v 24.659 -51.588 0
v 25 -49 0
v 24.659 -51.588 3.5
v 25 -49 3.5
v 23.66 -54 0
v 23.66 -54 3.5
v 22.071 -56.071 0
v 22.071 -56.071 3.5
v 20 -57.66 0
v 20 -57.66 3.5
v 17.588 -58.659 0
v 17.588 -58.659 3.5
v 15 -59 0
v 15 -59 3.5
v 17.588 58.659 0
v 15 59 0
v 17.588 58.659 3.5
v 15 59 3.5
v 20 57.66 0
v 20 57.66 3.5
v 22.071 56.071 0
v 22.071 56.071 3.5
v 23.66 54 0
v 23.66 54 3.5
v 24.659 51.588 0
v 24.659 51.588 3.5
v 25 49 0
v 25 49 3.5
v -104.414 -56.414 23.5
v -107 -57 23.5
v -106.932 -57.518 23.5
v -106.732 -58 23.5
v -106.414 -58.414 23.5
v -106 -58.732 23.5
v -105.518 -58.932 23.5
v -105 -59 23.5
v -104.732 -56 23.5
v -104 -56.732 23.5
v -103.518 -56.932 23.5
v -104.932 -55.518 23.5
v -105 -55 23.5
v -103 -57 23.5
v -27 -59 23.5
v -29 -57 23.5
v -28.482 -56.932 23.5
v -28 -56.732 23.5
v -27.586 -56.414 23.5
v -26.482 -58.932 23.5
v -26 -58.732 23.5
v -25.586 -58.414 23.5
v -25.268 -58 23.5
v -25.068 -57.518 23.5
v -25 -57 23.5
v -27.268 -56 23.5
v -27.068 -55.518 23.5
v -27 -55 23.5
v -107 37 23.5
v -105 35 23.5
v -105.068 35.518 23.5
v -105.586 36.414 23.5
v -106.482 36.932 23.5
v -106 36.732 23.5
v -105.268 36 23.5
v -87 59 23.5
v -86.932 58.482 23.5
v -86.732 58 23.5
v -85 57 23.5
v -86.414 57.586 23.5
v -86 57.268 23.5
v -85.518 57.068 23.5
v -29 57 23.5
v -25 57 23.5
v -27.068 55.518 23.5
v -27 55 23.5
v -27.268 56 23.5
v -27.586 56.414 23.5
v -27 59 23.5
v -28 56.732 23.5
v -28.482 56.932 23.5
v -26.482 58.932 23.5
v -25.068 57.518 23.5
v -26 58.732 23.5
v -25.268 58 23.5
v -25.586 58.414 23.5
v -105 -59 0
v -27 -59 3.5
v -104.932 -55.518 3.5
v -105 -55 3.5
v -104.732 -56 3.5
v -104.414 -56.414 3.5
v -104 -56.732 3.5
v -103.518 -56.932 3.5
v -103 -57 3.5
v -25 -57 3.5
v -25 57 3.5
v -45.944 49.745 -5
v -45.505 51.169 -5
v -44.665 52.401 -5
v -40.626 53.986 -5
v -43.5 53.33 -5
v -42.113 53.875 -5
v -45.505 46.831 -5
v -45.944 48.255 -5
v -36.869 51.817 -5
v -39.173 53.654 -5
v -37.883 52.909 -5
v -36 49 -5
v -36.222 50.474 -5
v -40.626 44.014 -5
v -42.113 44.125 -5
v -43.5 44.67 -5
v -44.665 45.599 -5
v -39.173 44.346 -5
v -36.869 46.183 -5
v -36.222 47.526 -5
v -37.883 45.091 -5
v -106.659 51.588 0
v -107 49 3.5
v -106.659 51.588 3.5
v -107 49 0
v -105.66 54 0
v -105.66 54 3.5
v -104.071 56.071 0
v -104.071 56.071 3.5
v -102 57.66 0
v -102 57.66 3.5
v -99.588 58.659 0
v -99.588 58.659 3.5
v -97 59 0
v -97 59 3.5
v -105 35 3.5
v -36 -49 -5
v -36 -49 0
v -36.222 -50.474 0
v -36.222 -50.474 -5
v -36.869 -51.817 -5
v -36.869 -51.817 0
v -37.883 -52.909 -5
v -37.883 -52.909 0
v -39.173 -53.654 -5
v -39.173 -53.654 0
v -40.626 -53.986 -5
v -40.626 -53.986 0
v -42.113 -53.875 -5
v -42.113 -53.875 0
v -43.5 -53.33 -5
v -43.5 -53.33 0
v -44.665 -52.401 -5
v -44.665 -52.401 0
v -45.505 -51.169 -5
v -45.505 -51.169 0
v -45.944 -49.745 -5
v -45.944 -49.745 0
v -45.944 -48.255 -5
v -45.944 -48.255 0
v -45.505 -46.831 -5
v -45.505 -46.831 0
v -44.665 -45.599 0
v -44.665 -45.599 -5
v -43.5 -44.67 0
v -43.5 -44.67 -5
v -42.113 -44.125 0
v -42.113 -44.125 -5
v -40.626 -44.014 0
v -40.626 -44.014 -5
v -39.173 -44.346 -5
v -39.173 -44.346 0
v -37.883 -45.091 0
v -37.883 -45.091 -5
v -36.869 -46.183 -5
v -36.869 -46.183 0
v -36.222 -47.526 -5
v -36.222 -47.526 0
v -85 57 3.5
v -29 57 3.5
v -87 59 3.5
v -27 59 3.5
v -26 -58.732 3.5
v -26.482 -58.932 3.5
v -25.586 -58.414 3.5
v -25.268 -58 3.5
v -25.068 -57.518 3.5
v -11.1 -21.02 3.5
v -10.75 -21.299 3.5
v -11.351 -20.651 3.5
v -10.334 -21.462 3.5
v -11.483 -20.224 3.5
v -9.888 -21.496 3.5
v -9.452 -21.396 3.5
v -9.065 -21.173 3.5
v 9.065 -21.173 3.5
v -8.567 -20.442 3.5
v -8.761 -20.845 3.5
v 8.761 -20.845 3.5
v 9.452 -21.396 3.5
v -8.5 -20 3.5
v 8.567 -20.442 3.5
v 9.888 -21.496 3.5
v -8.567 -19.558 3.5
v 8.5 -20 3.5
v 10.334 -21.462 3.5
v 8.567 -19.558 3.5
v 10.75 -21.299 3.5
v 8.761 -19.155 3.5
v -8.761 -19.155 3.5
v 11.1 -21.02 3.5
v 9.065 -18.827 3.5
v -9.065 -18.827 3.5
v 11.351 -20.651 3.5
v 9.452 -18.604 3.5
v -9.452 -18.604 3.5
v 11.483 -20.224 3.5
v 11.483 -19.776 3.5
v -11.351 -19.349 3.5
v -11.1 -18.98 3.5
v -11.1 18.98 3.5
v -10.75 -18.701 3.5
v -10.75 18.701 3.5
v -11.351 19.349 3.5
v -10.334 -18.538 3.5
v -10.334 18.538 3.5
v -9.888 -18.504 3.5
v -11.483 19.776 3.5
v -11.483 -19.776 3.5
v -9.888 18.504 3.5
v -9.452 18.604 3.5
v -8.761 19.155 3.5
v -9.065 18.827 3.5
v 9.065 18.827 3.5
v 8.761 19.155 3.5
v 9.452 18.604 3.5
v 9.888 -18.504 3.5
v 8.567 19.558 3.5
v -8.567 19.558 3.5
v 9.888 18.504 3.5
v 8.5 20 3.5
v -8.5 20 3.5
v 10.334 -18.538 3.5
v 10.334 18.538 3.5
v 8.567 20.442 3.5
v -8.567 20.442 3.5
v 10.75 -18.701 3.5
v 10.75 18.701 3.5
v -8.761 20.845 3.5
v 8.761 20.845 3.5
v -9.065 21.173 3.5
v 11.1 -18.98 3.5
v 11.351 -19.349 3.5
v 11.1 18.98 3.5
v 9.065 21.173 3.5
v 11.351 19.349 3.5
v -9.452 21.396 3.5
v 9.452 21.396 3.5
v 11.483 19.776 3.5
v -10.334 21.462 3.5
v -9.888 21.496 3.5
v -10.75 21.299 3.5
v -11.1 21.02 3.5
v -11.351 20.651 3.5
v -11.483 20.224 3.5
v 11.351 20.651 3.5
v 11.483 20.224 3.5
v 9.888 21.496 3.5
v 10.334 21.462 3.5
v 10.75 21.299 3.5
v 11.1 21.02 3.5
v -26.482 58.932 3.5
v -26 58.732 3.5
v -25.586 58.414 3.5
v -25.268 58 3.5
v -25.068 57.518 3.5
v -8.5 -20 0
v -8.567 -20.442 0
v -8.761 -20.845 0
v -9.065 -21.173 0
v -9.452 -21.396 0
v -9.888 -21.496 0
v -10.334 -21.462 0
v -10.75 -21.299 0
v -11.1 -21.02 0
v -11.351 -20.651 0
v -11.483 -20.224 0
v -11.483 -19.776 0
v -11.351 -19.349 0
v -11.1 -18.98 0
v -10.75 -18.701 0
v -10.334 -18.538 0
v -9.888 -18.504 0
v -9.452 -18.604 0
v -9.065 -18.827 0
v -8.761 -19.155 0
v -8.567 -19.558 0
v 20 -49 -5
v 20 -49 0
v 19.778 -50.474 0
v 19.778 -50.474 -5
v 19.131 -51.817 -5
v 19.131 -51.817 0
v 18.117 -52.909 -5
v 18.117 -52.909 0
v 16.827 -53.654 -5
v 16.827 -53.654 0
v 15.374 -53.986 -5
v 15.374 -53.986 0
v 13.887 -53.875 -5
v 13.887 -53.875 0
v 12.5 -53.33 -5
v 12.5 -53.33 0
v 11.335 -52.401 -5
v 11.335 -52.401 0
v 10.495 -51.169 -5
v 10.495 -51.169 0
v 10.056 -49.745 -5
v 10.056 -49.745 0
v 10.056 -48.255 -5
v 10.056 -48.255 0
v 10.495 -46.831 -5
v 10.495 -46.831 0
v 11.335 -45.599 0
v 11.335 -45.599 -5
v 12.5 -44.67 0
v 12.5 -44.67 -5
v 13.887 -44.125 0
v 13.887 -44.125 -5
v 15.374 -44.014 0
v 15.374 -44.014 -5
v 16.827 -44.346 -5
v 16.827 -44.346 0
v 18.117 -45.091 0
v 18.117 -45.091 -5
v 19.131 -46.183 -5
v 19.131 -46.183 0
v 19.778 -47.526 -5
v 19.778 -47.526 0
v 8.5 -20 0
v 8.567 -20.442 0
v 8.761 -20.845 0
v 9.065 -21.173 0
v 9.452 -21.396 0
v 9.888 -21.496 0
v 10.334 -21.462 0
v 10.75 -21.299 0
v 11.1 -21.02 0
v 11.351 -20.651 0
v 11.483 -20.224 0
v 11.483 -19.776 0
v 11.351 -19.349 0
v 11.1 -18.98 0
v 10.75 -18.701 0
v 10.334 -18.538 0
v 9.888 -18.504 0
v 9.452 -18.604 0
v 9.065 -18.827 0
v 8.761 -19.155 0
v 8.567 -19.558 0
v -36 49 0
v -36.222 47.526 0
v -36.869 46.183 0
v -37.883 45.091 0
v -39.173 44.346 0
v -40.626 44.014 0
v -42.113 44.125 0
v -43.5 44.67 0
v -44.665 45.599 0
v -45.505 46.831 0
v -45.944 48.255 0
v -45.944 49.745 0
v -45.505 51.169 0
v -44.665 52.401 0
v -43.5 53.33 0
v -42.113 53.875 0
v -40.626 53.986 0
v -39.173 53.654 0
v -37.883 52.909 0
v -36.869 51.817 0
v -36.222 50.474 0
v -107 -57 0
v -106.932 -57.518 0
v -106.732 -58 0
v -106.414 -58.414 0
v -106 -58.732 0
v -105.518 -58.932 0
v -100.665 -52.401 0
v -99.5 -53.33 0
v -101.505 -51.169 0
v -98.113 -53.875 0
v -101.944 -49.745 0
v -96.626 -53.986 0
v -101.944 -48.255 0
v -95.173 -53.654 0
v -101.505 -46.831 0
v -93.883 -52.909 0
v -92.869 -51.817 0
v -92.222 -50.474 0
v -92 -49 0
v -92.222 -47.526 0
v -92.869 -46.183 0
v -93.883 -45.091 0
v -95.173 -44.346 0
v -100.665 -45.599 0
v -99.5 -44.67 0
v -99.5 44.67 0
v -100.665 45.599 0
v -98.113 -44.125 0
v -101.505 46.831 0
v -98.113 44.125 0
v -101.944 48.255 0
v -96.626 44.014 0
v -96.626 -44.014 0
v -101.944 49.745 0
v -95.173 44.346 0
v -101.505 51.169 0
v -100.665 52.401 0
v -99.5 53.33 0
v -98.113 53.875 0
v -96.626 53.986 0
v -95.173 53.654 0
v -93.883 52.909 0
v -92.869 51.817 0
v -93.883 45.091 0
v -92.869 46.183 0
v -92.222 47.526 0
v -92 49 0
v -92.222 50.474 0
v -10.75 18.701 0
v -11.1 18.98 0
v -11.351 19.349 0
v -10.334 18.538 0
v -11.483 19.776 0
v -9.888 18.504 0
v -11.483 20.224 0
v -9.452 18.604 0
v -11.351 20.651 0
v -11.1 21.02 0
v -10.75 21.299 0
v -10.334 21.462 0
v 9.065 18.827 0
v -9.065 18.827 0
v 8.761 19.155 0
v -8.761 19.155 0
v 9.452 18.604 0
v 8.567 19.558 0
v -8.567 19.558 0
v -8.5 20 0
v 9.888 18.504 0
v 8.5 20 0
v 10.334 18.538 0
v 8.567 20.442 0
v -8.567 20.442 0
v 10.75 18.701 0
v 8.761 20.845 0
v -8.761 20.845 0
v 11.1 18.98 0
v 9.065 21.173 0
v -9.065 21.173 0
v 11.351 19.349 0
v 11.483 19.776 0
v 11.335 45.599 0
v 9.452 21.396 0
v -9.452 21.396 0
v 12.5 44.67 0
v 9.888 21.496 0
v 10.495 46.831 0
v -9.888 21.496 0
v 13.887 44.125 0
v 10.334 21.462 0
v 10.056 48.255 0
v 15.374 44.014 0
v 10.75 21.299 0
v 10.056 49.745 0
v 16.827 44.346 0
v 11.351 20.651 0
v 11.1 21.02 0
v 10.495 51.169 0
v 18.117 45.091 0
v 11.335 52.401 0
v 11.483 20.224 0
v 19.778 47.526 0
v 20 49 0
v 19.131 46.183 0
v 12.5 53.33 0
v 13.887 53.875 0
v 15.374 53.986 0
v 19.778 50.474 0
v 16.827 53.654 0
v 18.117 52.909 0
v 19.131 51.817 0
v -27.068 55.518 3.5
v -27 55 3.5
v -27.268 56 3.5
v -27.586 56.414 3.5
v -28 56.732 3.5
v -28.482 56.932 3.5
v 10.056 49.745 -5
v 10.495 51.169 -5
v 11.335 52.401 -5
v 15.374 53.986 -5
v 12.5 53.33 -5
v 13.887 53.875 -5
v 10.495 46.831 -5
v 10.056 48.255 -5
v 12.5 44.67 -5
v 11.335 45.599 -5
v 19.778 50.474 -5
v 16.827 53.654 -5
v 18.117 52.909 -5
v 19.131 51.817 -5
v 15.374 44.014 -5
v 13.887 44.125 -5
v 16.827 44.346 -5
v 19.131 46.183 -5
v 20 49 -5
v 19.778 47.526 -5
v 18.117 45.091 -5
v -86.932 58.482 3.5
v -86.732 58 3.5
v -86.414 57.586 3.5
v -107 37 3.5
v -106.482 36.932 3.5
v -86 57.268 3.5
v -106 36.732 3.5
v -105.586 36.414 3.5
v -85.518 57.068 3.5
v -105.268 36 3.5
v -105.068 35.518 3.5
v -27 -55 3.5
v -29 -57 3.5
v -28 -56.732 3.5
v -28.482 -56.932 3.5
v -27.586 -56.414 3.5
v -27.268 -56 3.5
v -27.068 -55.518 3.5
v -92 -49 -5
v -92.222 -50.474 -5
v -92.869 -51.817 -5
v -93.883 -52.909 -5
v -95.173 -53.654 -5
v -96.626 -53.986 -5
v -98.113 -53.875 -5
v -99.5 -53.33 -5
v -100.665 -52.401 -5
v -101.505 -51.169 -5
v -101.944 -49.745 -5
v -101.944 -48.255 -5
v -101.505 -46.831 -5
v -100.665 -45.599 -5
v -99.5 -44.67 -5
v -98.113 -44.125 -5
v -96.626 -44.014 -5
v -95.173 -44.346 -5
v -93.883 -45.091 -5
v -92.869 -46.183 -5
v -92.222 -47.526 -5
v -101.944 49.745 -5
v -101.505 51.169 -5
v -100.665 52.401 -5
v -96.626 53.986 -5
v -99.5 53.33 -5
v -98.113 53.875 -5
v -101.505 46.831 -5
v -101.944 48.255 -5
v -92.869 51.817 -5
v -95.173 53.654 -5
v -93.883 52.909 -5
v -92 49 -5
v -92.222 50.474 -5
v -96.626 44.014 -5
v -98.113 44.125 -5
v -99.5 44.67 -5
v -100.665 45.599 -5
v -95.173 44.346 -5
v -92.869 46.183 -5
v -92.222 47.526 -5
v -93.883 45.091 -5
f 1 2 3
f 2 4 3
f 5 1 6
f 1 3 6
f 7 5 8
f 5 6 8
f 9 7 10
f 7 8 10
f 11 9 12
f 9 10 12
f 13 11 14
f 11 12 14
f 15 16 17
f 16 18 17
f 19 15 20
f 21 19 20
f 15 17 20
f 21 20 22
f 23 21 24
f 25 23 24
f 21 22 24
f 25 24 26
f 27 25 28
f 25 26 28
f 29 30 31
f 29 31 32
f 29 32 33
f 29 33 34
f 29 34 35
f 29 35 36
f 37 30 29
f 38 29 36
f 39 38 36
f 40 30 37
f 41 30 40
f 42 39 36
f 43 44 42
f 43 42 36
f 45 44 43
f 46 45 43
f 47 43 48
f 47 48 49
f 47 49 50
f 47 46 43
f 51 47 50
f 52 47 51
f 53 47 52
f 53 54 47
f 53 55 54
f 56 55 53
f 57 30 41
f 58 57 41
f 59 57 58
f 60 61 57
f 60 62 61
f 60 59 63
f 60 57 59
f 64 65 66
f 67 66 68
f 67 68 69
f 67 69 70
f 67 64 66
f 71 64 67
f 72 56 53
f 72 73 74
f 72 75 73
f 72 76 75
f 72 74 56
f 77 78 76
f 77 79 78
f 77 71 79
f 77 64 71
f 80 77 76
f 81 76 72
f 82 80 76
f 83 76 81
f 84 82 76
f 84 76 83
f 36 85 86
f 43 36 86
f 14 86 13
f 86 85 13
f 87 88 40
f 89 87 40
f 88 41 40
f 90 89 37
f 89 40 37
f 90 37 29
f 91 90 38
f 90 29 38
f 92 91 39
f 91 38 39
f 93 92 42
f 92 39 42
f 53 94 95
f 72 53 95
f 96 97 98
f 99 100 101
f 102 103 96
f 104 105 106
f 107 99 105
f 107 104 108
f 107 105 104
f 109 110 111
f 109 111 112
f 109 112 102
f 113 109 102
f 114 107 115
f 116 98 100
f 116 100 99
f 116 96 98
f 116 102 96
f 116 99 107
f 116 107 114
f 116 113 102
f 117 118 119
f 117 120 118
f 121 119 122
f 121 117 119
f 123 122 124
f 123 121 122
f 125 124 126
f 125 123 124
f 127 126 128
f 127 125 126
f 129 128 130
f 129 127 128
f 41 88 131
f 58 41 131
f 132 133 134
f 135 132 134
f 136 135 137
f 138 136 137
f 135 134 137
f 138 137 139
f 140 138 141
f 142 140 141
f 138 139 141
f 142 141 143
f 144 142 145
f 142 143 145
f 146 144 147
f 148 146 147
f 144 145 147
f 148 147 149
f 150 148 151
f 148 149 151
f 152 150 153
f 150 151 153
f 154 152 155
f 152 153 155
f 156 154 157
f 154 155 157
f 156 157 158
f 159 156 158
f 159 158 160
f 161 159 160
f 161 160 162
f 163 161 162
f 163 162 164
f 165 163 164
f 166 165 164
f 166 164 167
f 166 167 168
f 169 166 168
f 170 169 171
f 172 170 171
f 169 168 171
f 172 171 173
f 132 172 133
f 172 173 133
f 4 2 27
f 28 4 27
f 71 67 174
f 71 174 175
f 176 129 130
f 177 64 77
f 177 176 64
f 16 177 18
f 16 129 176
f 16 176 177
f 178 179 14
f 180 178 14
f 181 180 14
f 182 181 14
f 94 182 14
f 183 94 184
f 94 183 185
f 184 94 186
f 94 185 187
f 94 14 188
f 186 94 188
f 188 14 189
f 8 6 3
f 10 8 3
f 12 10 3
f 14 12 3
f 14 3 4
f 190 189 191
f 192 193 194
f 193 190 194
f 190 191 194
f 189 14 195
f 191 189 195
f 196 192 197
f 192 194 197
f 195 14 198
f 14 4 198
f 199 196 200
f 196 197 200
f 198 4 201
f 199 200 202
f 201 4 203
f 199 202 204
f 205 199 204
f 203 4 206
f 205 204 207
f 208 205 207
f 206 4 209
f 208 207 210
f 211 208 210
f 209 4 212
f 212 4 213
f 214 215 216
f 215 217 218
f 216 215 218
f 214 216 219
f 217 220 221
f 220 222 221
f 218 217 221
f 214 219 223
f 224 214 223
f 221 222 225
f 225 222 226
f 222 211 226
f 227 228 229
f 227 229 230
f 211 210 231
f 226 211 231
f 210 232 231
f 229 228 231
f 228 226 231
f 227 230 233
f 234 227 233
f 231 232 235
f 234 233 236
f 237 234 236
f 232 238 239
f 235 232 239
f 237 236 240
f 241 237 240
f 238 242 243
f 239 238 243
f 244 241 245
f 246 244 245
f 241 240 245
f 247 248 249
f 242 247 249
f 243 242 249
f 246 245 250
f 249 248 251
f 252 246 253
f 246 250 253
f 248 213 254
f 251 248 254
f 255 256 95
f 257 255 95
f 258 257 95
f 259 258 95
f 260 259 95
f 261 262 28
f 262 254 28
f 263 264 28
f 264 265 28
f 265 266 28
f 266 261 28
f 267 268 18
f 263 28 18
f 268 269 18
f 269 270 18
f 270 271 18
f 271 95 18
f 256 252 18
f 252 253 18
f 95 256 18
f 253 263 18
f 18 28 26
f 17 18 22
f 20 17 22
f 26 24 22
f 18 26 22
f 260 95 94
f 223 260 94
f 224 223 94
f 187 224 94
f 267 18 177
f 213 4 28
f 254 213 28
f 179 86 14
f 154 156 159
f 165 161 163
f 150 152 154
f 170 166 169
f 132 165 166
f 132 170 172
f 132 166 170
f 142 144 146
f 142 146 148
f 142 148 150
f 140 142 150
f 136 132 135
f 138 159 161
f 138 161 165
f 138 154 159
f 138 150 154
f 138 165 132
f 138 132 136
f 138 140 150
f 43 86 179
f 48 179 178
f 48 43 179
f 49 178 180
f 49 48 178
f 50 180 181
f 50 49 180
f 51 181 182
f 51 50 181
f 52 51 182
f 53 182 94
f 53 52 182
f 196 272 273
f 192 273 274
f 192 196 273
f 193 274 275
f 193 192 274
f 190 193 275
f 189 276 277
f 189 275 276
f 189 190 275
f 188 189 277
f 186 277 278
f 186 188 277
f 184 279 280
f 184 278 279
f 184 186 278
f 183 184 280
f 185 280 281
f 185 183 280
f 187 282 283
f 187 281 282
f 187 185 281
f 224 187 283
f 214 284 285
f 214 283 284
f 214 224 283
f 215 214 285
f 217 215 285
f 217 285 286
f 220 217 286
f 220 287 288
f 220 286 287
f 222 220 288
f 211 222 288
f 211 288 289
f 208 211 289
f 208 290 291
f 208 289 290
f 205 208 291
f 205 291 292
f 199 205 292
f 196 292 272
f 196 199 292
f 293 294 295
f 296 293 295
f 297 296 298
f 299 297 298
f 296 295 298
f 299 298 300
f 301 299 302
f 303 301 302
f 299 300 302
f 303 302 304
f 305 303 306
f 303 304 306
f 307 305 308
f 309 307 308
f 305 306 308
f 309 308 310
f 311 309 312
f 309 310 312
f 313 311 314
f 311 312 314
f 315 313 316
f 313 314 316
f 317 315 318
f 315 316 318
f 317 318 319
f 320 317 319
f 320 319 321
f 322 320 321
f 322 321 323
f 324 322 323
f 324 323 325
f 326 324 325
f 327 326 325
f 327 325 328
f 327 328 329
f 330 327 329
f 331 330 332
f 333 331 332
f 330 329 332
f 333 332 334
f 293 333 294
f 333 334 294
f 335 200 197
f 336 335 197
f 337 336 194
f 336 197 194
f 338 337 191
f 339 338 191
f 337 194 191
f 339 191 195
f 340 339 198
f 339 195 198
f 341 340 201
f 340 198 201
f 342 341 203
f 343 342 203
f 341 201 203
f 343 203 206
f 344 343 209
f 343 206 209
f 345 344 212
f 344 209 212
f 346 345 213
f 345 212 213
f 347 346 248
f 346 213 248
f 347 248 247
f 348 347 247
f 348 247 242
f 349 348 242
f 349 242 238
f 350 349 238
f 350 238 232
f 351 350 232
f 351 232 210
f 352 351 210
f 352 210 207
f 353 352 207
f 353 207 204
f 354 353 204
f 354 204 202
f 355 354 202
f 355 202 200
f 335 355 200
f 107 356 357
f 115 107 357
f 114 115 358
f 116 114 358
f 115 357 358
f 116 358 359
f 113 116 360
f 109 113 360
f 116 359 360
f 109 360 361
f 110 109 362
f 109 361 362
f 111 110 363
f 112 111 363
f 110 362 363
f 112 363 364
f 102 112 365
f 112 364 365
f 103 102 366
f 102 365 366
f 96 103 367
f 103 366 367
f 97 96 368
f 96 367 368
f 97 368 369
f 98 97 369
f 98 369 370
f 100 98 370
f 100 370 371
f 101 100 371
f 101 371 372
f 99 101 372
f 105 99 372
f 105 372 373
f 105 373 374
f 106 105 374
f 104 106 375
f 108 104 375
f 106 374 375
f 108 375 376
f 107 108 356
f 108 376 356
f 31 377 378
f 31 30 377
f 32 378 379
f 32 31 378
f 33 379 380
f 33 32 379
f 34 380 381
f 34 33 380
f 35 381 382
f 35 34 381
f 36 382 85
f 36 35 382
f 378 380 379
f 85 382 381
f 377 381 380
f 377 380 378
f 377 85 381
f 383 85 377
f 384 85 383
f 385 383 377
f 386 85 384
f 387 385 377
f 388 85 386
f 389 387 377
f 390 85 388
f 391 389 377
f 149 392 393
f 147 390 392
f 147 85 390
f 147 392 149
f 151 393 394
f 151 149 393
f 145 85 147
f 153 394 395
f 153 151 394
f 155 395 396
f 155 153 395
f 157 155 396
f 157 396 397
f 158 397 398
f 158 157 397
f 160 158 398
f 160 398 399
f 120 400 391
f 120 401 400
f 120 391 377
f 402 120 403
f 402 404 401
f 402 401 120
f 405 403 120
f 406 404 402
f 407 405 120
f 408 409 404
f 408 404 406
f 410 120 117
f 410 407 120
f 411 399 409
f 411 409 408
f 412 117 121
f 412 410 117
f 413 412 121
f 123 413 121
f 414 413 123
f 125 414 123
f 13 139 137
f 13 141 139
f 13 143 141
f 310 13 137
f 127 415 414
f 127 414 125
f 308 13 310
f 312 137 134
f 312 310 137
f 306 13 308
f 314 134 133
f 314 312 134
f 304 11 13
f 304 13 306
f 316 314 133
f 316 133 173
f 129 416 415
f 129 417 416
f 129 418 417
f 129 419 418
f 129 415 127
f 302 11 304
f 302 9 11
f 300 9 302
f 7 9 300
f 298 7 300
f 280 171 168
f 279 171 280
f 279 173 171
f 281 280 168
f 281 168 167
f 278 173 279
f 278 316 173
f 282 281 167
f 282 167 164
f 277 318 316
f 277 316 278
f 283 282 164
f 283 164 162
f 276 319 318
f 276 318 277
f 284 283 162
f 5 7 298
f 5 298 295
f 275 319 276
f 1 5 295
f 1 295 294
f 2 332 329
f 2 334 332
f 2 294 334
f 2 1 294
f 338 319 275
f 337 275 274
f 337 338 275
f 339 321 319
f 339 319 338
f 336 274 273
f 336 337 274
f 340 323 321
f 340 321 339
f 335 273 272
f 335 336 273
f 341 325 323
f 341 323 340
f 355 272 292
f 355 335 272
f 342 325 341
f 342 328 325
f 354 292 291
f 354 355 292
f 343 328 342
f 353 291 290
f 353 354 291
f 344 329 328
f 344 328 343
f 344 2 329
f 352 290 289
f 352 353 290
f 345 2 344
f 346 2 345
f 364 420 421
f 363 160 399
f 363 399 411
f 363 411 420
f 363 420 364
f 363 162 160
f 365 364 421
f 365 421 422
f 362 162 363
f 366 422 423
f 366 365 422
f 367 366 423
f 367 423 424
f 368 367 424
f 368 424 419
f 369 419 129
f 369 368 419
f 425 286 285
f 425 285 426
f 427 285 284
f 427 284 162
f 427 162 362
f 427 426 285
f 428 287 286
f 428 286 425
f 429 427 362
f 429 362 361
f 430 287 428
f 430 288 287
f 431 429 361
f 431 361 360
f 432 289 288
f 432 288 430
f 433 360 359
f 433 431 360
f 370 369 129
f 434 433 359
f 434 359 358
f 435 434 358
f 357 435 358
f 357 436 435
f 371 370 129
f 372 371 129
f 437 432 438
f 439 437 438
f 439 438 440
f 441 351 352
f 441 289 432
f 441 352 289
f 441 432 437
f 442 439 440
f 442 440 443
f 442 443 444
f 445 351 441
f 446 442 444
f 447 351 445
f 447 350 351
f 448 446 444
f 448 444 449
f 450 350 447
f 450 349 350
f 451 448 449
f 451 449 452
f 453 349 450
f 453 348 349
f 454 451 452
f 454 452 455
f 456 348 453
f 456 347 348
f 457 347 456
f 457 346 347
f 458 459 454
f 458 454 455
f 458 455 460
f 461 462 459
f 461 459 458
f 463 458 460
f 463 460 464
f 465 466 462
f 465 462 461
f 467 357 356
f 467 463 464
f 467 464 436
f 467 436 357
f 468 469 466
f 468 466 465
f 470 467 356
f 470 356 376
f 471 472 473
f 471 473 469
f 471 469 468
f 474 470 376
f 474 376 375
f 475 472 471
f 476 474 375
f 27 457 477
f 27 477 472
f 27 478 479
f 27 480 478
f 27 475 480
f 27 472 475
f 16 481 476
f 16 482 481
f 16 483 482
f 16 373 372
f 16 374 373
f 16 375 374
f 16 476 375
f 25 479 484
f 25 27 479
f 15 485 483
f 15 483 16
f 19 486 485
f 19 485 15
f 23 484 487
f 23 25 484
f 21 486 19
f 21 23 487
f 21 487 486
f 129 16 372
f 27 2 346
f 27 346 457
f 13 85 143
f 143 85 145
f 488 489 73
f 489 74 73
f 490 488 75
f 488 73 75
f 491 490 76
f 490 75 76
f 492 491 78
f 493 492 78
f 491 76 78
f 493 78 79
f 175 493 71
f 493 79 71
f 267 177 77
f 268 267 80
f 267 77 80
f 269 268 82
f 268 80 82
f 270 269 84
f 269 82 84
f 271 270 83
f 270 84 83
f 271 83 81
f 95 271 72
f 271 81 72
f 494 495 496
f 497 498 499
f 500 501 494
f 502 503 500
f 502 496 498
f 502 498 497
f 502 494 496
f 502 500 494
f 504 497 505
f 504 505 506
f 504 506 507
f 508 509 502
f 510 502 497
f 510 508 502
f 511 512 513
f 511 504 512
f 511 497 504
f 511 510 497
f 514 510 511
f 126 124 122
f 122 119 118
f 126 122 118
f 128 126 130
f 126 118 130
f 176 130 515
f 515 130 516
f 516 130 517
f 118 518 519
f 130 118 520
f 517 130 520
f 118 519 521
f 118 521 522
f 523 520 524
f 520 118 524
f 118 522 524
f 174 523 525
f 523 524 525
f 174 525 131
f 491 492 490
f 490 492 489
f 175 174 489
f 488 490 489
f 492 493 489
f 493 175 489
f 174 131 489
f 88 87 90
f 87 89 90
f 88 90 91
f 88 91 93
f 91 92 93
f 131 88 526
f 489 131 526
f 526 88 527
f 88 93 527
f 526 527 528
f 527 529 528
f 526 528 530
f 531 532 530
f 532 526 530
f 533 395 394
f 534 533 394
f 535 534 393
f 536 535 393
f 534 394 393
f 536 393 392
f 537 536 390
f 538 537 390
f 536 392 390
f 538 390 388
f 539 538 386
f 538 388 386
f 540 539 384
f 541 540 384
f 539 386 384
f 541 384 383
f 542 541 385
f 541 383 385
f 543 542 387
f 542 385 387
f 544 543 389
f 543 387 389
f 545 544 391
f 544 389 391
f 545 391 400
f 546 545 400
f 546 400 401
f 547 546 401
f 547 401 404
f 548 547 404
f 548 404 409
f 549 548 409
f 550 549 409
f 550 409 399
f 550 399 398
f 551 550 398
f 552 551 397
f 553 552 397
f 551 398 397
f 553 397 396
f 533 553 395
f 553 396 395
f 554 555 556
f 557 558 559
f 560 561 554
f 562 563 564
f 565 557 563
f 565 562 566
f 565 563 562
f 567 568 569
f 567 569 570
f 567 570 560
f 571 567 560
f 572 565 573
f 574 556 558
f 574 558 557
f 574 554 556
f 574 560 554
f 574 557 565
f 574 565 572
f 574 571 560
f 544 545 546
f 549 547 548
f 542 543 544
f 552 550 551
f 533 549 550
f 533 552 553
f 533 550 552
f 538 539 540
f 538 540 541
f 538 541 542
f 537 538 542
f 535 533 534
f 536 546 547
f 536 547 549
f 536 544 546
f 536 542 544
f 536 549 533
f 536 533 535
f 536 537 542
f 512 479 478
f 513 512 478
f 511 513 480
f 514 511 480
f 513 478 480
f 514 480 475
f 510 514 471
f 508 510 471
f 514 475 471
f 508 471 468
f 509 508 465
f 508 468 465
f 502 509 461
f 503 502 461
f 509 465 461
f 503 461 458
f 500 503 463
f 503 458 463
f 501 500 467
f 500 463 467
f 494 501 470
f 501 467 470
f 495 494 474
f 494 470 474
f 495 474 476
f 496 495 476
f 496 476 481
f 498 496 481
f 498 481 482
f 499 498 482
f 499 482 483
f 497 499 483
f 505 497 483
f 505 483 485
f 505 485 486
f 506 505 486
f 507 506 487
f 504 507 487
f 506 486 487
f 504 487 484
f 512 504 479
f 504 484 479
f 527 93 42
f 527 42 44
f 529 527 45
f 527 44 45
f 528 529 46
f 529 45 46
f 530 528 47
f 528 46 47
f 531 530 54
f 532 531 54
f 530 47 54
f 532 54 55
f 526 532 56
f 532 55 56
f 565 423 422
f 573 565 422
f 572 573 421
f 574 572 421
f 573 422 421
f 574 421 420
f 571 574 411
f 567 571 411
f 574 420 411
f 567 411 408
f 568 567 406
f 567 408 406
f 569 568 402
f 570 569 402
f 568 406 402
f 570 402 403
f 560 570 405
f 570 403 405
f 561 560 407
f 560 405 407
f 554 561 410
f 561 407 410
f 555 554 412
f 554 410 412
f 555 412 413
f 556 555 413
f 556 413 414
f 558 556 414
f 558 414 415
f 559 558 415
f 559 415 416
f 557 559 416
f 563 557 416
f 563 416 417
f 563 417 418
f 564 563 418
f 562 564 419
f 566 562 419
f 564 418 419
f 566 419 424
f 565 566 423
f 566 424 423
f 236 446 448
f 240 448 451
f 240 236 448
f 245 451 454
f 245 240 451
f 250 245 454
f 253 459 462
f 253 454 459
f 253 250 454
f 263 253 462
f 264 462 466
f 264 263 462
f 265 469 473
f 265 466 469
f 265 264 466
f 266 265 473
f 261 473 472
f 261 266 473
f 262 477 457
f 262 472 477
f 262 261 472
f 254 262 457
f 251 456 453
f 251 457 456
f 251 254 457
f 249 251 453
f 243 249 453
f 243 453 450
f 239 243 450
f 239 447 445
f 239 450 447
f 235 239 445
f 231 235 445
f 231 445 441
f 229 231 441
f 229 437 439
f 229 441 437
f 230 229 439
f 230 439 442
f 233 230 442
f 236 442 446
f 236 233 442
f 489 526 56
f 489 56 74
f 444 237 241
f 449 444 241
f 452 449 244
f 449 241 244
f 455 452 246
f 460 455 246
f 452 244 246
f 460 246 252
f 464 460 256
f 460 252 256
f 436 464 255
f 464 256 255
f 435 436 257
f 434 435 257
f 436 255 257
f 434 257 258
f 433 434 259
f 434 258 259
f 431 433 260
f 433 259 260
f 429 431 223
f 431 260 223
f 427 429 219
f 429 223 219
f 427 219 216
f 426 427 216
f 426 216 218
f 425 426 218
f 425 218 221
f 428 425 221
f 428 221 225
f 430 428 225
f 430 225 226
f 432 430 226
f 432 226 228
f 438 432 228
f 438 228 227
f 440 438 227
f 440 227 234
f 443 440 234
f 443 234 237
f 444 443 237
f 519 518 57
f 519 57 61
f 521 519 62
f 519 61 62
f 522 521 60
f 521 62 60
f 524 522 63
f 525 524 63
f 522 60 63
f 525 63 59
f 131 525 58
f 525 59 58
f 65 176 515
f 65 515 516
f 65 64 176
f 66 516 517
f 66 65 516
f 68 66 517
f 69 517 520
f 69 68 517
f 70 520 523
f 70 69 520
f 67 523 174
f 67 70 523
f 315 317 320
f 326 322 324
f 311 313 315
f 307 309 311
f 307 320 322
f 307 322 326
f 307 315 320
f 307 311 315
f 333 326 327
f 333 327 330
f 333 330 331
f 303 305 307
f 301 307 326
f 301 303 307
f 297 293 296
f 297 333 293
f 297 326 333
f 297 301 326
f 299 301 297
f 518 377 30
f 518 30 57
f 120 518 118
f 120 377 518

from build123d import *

# Parameters (mm, degrees)
SKETCH_1_W                                 = 50
SKETCH_1_H                                 = 118
EXTRUDE_1_DEPTH                            = 3.5
SKETCH_3_R                                 = 1.5
CUT_EXTRUDE_1_DEPTH                        = 65.1735927
MIRROR_1_AT_THE_SECOND_PLANE_COPY_1_SKET_R = 1.5
MIRROR_1_AT_THE_SECOND_PLANE_COPY_1_DEPTH  = 65.1735927
SKETCH_4_W                                 = 3.5
SKETCH_4_H                                 = 118
EXTRUDE_2_DEPTH                            = 82
EXTRUDE_4_OUTLINE_W                        = 82
EXTRUDE_4_OUTLINE_H                        = 118
EXTRUDE_4_OUTLINE_W_2                      = 78
EXTRUDE_4_OUTLINE_H_2                      = 114
EXTRUDE_4_DEPTH                            = 20
SKETCH_6_W                                 = 2
SKETCH_6_H                                 = 20
SKETCH_6_W_2                               = 18
CUT_EXTRUDE_2_DEPTH                        = 20
SKETCH_7_W                                 = 18
SKETCH_7_H                                 = 20
SKETCH_7_W_2                               = 2
CUT_EXTRUDE_3_DEPTH                        = 20
FILLET_1_R                                 = 10
FILLET_2_R                                 = 2
FILLET_3_R                                 = 2
SKETCH_8_R                                 = 5
EXTRUDE_3_DEPTH                            = 5
SKETCH_9_R                                 = 5
EXTRUDE_4_2_DEPTH                          = 5


# Read off the part's stored shape, not the designer's step: 拉伸-薄壁4
with BuildPart() as part:
    # 草图1 → 凸台-拉伸1 (new body)
    with BuildSketch(Plane.XY):
        Rectangle(SKETCH_1_W, SKETCH_1_H)
    extrude(amount=EXTRUDE_1_DEPTH)

    # 草图3 → 切除-拉伸1 (cut, through all)
    with BuildSketch(Plane.XY.offset(3.5)):
        with Locations((-10, 20)):
            Circle(SKETCH_3_R)
    cut_extrude_1 = extrude(amount=-CUT_EXTRUDE_1_DEPTH, mode=Mode.SUBTRACT)

    # 镜向1: 切除-拉伸1 across plane
    add(cut_extrude_1.mirror(Plane(origin=(0, 0, 0), x_dir=(0, 0, 1), z_dir=(1, 0, 0))), mode=Mode.SUBTRACT)

    # 镜向1 at the second plane: 切除-拉伸1 across plane
    add(cut_extrude_1.mirror(Plane.ZX), mode=Mode.SUBTRACT)

    # 镜向1 at the second plane copy 1 sket → 镜向1 at the second plane copy 1 (cut, through all)
    with BuildSketch(Plane(origin=(0, 0, 3.5), x_dir=(-1, 0, 0), z_dir=(0, 0, 1))):
        with Locations((-10, 20)):
            Circle(MIRROR_1_AT_THE_SECOND_PLANE_COPY_1_SKET_R)
    extrude(amount=-MIRROR_1_AT_THE_SECOND_PLANE_COPY_1_DEPTH, mode=Mode.SUBTRACT)

    # 草图4 → 凸台-拉伸2 (add)
    with BuildSketch(Plane.ZY.offset(25)):
        with Locations((1.75, 0)):
            Rectangle(SKETCH_4_W, SKETCH_4_H)
    extrude(amount=EXTRUDE_2_DEPTH)

    # Extrude 4 outline → Extrude 4 (add)
    with BuildSketch(Plane.XY.offset(3.5)):
        with Locations((-66, 0)):
            Rectangle(EXTRUDE_4_OUTLINE_W, EXTRUDE_4_OUTLINE_H)
        with Locations((-66, 0)):
            Rectangle(EXTRUDE_4_OUTLINE_W_2, EXTRUDE_4_OUTLINE_H_2, mode=Mode.SUBTRACT)
    extrude(amount=EXTRUDE_4_DEPTH)

    # 草图6 → 切除-拉伸2 (cut)
    with BuildSketch(Plane.XZ.offset(-57)):
        with Locations((-106, 13.5)):
            Rectangle(SKETCH_6_W, SKETCH_6_H)
        with Locations((-96, 13.5)):
            Rectangle(SKETCH_6_W_2, SKETCH_6_H)
    extrude(amount=CUT_EXTRUDE_2_DEPTH, mode=Mode.SUBTRACT)

    # 草图7 → 切除-拉伸3 (cut)
    with BuildSketch(Plane.XZ.offset(-57)):
        with Locations((-96, 13.5)):
            Rectangle(SKETCH_7_W, SKETCH_7_H)
        with Locations((-106, 13.5)):
            Rectangle(SKETCH_7_W_2, SKETCH_7_H)
    extrude(amount=-CUT_EXTRUDE_3_DEPTH, mode=Mode.SUBTRACT)

    # 圆角1
    fillet_1_edges = [part.edges().sort_by_distance(p)[0] for p in [
        (25, -59, 1.75),
        (25, 59, 1.75),
        (-107, 59, 1.75),
    ]]
    fillet(fillet_1_edges, radius=FILLET_1_R)

    # 圆角2
    fillet_2_edges = [part.edges().sort_by_distance(p)[0] for p in [
        (-87, 57, 13.5),
        (-107, -59, 11.75),
        (-25, -59, 13.5),
        (-25, 59, 13.5),
        (-105, 37, 13.5),
    ]]
    fillet(fillet_2_edges, radius=FILLET_2_R - 0.0001)  # a hair under: the kernel refuses the full size

    # 圆角3
    fillet_3_edges = [part.edges().sort_by_distance(p)[0] for p in [
        (-27, 57, 13.5),
        (-105, -57, 13.5),
        (-27, -57, 13.5),
    ]]
    fillet(fillet_3_edges, radius=FILLET_3_R)

    # 草图8 → 凸台-拉伸3 (add)
    with BuildSketch(Plane(origin=(0, 0, 0), x_dir=(-1, 0, 0), z_dir=(0, 0, -1))):
        with Locations(Location((-15, 49, 0), (0, 0, 180))):
            Circle(SKETCH_8_R)
        with Locations(Location((97, 49, 0), (0, 0, 180))):
            Circle(SKETCH_8_R)
        with Locations(Location((-15, -49, 0), (0, 0, 180))):
            Circle(SKETCH_8_R)
        with Locations(Location((97, -49, 0), (0, 0, 180))):
            Circle(SKETCH_8_R)
    extrude(amount=EXTRUDE_3_DEPTH)

    # 草图9 → Extrude 4 2 (add)
    with BuildSketch(Plane(origin=(0, 0, 0), x_dir=(-1, 0, 0), z_dir=(0, 0, -1))):
        with Locations(Location((41, 49, 0), (0, 0, 180))):
            Circle(SKETCH_9_R)
        with Locations(Location((41, -49, 0), (0, 0, 180))):
            Circle(SKETCH_9_R)
    extrude(amount=EXTRUDE_4_2_DEPTH)


solid = part.part
